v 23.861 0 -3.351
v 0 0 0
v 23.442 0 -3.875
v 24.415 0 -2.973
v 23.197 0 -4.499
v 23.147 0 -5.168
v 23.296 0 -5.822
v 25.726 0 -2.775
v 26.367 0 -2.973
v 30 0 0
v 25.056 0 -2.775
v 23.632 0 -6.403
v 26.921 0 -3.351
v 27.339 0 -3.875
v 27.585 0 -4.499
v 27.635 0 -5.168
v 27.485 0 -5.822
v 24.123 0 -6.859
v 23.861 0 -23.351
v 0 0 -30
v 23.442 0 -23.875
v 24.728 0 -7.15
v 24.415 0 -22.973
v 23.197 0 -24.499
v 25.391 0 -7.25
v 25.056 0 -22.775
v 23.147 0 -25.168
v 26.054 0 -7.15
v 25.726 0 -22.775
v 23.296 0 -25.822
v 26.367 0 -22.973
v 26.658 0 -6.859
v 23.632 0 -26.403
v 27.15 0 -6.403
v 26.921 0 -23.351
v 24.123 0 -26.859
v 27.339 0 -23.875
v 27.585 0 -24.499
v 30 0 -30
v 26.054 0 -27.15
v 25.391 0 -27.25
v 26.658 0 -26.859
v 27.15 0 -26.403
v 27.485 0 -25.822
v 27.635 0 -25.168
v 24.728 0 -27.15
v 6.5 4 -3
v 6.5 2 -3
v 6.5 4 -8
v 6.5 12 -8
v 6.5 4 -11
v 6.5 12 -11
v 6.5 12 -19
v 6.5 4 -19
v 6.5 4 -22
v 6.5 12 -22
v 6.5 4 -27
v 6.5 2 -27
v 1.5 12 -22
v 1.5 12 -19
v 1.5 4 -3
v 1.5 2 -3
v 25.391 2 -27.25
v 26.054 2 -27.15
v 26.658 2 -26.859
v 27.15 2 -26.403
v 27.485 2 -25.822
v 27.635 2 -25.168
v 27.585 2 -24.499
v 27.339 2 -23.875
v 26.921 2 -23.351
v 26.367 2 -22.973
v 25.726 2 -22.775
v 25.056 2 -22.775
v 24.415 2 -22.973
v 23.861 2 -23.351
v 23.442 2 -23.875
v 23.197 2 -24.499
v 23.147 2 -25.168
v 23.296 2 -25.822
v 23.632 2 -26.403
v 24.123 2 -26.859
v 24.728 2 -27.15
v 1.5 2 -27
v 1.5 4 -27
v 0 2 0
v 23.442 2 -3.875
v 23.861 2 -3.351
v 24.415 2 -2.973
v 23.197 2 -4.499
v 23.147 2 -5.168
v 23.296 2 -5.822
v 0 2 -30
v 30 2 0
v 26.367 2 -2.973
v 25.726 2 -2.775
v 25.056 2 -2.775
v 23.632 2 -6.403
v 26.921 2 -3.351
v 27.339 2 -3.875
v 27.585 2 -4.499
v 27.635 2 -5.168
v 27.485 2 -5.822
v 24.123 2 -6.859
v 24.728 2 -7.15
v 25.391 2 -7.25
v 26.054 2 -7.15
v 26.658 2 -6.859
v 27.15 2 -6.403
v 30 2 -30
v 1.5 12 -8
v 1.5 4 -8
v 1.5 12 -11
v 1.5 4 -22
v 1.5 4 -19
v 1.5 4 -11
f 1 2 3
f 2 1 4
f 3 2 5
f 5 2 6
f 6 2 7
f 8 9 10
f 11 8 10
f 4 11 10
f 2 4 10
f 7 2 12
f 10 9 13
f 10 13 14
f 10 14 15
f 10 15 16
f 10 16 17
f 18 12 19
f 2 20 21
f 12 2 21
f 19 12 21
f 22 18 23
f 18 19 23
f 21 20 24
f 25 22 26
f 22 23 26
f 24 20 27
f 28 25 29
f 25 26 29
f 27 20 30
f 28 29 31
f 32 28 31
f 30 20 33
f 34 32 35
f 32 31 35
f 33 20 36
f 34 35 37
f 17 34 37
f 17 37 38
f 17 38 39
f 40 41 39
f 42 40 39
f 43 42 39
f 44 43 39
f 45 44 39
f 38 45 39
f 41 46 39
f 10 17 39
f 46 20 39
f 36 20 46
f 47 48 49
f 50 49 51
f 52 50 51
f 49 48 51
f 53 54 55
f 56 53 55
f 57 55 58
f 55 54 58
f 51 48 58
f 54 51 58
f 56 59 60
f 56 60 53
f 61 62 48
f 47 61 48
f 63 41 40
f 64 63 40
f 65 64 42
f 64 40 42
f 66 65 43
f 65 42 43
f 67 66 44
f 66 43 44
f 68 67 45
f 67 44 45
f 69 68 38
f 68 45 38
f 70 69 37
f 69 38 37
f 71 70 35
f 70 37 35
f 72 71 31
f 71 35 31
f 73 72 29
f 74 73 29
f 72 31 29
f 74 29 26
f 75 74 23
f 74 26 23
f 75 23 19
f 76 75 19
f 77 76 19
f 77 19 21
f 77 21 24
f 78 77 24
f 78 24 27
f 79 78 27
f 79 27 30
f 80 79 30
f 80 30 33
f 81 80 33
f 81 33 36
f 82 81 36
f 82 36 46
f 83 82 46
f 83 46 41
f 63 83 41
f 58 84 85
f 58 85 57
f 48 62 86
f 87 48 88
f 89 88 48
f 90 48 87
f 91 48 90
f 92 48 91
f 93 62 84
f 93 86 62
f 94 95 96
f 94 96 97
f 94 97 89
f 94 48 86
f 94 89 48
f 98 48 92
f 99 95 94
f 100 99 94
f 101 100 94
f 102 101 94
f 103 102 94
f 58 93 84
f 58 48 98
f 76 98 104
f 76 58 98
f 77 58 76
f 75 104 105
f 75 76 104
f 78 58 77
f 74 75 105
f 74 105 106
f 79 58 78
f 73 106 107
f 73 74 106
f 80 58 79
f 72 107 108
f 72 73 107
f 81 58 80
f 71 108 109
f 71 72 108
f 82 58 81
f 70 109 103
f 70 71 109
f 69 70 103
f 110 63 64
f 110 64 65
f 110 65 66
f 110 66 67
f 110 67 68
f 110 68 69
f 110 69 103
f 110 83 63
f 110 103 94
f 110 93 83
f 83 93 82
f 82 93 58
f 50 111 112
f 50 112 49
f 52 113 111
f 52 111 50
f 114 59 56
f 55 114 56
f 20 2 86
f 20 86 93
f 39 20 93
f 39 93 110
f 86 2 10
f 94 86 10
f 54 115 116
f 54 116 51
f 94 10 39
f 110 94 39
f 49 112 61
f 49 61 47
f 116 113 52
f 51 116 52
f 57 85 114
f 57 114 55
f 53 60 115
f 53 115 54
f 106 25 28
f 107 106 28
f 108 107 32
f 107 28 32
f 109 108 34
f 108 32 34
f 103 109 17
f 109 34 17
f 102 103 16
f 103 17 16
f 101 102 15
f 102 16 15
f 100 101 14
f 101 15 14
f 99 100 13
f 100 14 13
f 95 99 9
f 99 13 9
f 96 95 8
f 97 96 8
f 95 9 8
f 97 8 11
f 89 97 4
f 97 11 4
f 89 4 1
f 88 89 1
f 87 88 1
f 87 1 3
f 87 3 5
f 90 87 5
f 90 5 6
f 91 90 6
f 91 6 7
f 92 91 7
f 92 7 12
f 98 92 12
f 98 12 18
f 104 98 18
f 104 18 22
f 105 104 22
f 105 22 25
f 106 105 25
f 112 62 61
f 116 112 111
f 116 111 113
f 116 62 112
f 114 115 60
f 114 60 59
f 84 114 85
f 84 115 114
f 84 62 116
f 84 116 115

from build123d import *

# Parameters (mm, degrees)
SKETCH1_W           = 30
SKETCH1_H           = 30
BOSS_EXTRUDE1_DEPTH = 2
SKETCH2_W           = 5
SKETCH2_H           = 24
BOSS_EXTRUDE2_DEPTH = 10
SKETCH3_W           = 5
SKETCH3_H           = 5
SKETCH3_H_2         = 8
CUT_EXTRUDE1_DEPTH  = 8
SKETCH4_R           = 2.25
CUT_EXTRUDE2_DEPTH  = 10


with BuildPart() as part:
    # Sketch1 → Boss-Extrude1 (new body)
    with BuildSketch(Plane(origin=(0, 0, 0), x_dir=(1, 0, 0), z_dir=(0, 1, 0))):
        with Locations((15, 15)):
            Rectangle(SKETCH1_W, SKETCH1_H)
    extrude(amount=BOSS_EXTRUDE1_DEPTH)

    # Sketch2 → Boss-Extrude2 (add)
    with BuildSketch(Plane(origin=(0, 2, 0), x_dir=(1, 0, 0), z_dir=(0, 1, 0))):
        with Locations((4, 15)):
            Rectangle(SKETCH2_W, SKETCH2_H)
    extrude(amount=BOSS_EXTRUDE2_DEPTH)

    # Sketch3 → Cut-Extrude1 (cut)
    with BuildSketch(Plane(origin=(0, 12, 0), x_dir=(1, 0, 0), z_dir=(0, 1, 0))):
        with Locations((4, 24.5)):
            Rectangle(SKETCH3_W, SKETCH3_H)
        with Locations((4, 5.5)):
            Rectangle(SKETCH3_W, SKETCH3_H)
        with Locations((4, 15)):
            Rectangle(SKETCH3_W, SKETCH3_H_2)
    extrude(amount=-CUT_EXTRUDE1_DEPTH, mode=Mode.SUBTRACT)

    # Sketch4 → Cut-Extrude2 (cut)
    with BuildSketch(Plane.XZ):
        with Locations(Location((25.390935128, -5, 0), (0, 0, 270))):
            Circle(SKETCH4_R)
        with Locations(Location((25.390935128, -25, 0), (0, 0, 270))):
            Circle(SKETCH4_R)
    extrude(amount=-CUT_EXTRUDE2_DEPTH, mode=Mode.SUBTRACT)


solid = part.part
